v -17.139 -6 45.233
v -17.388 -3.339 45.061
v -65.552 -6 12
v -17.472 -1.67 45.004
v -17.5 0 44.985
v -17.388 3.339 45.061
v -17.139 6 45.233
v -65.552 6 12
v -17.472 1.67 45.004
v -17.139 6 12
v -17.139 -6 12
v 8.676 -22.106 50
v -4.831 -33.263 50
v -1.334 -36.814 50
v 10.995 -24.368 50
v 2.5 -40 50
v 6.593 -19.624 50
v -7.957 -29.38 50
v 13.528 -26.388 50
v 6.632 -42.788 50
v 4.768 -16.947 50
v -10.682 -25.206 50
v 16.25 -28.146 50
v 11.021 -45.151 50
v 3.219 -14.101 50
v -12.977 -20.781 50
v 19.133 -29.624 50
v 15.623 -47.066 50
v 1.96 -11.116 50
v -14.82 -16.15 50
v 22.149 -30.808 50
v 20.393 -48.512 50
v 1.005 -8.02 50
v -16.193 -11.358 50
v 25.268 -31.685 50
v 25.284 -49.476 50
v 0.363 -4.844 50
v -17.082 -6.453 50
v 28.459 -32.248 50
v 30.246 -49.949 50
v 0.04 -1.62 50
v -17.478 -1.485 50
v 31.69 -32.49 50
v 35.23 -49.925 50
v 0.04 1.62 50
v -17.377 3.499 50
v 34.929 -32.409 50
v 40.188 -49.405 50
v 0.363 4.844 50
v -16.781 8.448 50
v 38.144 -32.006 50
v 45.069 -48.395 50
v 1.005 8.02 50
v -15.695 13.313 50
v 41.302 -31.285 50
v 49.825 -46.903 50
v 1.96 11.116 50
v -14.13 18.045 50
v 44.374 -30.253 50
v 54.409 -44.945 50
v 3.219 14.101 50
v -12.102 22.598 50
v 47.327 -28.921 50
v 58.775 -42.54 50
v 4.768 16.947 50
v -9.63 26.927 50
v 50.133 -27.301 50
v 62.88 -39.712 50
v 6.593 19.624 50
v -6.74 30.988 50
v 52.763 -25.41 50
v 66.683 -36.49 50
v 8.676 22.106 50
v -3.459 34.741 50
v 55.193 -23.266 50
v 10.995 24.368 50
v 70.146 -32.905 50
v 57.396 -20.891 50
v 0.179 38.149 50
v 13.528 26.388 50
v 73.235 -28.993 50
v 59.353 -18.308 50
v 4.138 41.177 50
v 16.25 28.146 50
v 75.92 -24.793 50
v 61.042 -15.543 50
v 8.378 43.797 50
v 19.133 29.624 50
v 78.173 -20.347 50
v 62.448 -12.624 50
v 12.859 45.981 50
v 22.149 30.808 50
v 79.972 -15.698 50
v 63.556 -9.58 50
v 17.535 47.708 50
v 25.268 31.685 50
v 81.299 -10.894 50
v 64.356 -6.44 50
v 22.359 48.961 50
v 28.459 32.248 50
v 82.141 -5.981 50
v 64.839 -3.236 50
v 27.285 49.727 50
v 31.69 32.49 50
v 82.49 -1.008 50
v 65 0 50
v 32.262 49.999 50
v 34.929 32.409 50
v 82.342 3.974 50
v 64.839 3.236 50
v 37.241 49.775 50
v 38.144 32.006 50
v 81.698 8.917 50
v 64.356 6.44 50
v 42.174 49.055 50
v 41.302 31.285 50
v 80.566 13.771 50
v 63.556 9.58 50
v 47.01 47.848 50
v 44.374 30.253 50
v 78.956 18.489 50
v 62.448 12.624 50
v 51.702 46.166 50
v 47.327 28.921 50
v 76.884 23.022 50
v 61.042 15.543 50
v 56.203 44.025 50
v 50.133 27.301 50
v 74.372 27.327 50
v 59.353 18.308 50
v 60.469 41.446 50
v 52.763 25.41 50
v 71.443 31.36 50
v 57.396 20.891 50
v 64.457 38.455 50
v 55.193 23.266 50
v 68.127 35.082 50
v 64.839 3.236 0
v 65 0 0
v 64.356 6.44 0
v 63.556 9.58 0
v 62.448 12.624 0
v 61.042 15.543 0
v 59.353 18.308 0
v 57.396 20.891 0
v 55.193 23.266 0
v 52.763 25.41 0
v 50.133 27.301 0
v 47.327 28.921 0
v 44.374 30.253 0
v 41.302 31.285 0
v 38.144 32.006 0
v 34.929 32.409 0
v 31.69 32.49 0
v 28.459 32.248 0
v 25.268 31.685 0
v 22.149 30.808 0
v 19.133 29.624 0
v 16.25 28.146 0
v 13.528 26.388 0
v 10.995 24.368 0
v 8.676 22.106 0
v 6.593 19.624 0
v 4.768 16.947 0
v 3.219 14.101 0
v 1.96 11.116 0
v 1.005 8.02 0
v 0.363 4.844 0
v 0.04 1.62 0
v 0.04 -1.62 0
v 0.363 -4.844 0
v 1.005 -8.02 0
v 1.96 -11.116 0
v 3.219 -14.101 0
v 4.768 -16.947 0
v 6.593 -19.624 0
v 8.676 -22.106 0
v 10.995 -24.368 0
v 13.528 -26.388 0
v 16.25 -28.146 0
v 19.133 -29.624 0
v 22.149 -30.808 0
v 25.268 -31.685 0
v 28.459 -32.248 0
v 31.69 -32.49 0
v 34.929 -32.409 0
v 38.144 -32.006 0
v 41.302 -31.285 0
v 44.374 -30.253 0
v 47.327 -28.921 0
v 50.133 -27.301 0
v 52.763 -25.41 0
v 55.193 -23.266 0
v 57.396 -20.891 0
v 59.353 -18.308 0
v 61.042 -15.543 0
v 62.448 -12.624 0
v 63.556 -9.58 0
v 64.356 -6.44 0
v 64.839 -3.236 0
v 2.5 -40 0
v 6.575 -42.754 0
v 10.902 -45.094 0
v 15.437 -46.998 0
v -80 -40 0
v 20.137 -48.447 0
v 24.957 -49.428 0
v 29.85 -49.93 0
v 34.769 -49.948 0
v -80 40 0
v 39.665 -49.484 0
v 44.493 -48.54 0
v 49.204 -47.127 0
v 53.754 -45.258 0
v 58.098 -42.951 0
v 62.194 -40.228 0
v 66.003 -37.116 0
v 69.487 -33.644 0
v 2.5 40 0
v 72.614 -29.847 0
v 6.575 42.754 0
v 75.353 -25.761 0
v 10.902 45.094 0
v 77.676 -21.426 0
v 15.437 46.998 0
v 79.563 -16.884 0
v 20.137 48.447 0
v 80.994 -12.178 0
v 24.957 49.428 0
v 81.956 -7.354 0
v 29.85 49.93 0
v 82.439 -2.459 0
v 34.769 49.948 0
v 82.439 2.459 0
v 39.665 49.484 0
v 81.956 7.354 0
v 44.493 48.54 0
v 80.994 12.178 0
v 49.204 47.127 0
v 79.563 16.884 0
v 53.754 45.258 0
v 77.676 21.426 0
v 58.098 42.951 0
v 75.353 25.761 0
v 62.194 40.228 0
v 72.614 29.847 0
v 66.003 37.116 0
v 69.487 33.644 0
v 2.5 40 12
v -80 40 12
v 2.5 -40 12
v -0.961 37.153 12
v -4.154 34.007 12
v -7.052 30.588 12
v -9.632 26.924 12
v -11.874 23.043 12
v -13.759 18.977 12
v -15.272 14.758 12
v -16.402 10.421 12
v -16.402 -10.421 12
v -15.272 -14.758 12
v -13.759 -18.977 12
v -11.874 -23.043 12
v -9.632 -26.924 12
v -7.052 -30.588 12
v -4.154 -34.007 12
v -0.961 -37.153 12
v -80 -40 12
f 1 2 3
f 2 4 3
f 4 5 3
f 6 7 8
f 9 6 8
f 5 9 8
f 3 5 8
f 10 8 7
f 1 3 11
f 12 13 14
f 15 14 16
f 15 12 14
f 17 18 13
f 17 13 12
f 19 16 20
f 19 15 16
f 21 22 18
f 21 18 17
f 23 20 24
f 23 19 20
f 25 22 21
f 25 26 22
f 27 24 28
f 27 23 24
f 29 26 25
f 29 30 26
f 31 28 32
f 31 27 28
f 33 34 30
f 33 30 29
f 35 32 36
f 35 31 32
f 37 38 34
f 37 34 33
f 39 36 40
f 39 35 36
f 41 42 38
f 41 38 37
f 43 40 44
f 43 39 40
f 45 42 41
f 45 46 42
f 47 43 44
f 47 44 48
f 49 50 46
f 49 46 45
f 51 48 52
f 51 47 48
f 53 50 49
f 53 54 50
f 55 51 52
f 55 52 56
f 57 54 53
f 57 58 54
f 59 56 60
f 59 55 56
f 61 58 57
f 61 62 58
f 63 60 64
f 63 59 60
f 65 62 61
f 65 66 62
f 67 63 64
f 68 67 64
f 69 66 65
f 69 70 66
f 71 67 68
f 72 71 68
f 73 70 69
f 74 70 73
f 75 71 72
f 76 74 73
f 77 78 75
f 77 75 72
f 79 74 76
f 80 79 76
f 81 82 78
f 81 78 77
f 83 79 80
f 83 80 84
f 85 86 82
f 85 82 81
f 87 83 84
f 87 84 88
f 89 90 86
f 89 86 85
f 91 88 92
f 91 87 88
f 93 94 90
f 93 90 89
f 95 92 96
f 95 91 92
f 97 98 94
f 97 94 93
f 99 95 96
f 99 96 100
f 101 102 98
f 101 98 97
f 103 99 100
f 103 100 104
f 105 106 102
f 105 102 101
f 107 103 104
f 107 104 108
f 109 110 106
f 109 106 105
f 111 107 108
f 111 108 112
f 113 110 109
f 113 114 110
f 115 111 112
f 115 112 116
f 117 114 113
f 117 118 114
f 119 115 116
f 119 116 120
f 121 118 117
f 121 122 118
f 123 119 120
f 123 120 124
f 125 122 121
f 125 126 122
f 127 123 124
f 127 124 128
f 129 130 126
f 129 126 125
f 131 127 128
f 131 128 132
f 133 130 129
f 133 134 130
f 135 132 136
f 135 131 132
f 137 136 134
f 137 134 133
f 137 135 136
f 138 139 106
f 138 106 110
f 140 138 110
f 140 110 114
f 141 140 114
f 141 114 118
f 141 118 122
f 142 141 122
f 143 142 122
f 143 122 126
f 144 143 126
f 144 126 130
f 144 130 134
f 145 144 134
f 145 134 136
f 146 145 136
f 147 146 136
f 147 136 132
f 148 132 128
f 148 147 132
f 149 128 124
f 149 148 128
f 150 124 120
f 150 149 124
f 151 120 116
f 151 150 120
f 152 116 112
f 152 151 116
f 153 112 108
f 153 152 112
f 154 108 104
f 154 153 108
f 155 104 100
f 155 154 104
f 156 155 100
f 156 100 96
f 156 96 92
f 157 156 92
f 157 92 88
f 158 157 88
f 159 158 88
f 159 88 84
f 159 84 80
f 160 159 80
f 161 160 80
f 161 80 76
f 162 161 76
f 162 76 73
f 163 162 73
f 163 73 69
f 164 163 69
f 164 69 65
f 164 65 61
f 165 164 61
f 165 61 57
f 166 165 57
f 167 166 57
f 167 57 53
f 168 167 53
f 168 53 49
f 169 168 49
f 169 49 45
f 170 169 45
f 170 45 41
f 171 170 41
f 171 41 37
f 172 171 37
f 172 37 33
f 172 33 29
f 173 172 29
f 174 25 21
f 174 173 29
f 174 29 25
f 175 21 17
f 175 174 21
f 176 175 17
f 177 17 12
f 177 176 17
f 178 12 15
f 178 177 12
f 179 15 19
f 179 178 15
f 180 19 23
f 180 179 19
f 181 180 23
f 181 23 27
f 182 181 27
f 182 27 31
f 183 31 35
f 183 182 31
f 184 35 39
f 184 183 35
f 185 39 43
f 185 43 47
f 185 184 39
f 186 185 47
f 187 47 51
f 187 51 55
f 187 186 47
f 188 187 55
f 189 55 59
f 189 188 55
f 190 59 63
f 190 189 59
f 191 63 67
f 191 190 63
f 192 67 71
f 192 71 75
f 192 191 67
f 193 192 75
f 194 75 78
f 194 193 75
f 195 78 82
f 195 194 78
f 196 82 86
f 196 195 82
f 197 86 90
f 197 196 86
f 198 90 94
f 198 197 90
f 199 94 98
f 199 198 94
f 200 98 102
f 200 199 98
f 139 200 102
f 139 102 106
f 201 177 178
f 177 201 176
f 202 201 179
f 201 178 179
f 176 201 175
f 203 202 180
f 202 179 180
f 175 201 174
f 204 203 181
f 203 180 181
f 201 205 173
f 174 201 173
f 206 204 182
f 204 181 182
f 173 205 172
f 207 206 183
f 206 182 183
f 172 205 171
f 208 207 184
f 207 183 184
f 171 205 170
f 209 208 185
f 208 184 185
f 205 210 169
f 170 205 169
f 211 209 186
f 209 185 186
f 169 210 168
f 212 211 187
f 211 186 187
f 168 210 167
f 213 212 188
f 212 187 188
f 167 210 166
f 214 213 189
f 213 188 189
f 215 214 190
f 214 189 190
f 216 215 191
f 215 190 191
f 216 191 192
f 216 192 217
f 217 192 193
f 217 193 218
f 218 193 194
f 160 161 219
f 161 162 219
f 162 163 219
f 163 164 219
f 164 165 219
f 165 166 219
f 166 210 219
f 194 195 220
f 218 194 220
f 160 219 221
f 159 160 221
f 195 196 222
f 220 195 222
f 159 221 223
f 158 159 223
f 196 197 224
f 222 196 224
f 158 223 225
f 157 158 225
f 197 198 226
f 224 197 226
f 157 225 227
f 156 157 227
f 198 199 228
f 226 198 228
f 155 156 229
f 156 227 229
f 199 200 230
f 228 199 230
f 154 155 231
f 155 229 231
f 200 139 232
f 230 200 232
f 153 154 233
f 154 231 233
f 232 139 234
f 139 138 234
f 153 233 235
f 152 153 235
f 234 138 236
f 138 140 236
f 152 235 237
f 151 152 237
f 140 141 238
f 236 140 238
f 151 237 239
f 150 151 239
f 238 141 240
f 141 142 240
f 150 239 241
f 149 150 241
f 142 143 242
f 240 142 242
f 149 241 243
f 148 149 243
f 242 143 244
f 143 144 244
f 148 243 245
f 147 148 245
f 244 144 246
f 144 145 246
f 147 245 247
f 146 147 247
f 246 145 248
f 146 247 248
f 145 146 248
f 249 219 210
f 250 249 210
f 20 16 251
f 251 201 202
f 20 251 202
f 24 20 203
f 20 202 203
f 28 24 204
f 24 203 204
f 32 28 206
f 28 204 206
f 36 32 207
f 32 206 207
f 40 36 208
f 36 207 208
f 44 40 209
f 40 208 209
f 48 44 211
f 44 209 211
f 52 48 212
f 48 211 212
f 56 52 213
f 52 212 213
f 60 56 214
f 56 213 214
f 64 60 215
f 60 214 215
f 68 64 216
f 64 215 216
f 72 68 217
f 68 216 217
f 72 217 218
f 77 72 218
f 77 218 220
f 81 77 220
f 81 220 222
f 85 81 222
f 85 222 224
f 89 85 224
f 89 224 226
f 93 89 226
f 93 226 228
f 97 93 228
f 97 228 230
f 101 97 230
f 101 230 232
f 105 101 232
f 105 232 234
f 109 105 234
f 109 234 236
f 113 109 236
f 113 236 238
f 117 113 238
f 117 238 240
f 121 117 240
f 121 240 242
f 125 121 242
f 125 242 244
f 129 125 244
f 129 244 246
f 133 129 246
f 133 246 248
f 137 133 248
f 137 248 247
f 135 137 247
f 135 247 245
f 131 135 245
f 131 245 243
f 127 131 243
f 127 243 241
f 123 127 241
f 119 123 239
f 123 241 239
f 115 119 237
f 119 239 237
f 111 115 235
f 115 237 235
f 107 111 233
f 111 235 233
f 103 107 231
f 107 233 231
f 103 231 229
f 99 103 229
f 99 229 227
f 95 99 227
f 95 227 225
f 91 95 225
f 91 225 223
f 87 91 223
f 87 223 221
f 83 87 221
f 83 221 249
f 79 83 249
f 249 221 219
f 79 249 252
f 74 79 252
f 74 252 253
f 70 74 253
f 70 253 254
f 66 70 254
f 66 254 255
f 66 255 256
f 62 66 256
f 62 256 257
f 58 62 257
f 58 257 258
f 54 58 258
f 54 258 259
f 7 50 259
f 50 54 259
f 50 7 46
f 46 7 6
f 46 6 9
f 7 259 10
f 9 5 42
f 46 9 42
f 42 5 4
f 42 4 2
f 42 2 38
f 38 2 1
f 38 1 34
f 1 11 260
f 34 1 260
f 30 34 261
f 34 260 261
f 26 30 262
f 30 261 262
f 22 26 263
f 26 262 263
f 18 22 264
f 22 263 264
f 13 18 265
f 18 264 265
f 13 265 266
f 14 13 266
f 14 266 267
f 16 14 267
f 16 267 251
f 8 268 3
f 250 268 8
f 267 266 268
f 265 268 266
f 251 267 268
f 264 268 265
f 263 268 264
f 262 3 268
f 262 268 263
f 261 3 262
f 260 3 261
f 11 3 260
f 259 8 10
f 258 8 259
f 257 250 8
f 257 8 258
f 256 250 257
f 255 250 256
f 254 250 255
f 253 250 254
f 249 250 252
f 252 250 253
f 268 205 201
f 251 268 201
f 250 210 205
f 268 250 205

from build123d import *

# Parameters (mm, degrees)
F0_R          = 32.5
F1_DEPTH      = 50
F2_DEPTH      = 12
F4_DEPTH      = 6
F4_DEPTH_BACK = 6


with BuildPart() as f1:
    # F0 (on Top) → F1 (new body)
    with BuildSketch(Plane.XY):
        with BuildLine():
            ThreePointArc((82.5, 0), (54.860679775, 44.72135955), (2.5, 40))
            ThreePointArc((2.5, 40), (-17.5, 0), (2.5, -40))
            ThreePointArc((2.5, -40), (54.860679775, -44.72135955), (82.5, 0))
        make_face()
        with Locations((32.5, 0)):
            Circle(F0_R, mode=Mode.SUBTRACT)
    extrude(amount=F1_DEPTH)

    # F0 (on Top) → F2 (join)
    with BuildSketch(Plane.XY):
        with BuildLine():
            Line((2.5, 40), (-80, 40))
            Line((-80, 40), (-80, -40))
            Line((-80, -40), (2.5, -40))
            ThreePointArc((2.5, -40), (-17.5, 0), (2.5, 40))
        make_face()
        with BuildLine():
            ThreePointArc((82.5, 0), (54.860679775, 44.72135955), (2.5, 40))
            ThreePointArc((2.5, 40), (-17.5, 0), (2.5, -40))
            ThreePointArc((2.5, -40), (54.860679775, -44.72135955), (82.5, 0))
        make_face()
        with Locations((32.5, 0)):
            Circle(F0_R, mode=Mode.SUBTRACT)
    extrude(amount=F2_DEPTH)

    # F3 (on Front) → F4 (join, two sides)
    with BuildSketch(Plane.XZ) as f4_sk:
        Polygon((-15.4150407761, 46.4158691466), (-67.7281171784, 10.5064402626), (-15.4150407761, 10.5064402626), align=None)
    extrude(amount=-F4_DEPTH)
    extrude(f4_sk.sketch, amount=F4_DEPTH_BACK)


solid = f1.part
